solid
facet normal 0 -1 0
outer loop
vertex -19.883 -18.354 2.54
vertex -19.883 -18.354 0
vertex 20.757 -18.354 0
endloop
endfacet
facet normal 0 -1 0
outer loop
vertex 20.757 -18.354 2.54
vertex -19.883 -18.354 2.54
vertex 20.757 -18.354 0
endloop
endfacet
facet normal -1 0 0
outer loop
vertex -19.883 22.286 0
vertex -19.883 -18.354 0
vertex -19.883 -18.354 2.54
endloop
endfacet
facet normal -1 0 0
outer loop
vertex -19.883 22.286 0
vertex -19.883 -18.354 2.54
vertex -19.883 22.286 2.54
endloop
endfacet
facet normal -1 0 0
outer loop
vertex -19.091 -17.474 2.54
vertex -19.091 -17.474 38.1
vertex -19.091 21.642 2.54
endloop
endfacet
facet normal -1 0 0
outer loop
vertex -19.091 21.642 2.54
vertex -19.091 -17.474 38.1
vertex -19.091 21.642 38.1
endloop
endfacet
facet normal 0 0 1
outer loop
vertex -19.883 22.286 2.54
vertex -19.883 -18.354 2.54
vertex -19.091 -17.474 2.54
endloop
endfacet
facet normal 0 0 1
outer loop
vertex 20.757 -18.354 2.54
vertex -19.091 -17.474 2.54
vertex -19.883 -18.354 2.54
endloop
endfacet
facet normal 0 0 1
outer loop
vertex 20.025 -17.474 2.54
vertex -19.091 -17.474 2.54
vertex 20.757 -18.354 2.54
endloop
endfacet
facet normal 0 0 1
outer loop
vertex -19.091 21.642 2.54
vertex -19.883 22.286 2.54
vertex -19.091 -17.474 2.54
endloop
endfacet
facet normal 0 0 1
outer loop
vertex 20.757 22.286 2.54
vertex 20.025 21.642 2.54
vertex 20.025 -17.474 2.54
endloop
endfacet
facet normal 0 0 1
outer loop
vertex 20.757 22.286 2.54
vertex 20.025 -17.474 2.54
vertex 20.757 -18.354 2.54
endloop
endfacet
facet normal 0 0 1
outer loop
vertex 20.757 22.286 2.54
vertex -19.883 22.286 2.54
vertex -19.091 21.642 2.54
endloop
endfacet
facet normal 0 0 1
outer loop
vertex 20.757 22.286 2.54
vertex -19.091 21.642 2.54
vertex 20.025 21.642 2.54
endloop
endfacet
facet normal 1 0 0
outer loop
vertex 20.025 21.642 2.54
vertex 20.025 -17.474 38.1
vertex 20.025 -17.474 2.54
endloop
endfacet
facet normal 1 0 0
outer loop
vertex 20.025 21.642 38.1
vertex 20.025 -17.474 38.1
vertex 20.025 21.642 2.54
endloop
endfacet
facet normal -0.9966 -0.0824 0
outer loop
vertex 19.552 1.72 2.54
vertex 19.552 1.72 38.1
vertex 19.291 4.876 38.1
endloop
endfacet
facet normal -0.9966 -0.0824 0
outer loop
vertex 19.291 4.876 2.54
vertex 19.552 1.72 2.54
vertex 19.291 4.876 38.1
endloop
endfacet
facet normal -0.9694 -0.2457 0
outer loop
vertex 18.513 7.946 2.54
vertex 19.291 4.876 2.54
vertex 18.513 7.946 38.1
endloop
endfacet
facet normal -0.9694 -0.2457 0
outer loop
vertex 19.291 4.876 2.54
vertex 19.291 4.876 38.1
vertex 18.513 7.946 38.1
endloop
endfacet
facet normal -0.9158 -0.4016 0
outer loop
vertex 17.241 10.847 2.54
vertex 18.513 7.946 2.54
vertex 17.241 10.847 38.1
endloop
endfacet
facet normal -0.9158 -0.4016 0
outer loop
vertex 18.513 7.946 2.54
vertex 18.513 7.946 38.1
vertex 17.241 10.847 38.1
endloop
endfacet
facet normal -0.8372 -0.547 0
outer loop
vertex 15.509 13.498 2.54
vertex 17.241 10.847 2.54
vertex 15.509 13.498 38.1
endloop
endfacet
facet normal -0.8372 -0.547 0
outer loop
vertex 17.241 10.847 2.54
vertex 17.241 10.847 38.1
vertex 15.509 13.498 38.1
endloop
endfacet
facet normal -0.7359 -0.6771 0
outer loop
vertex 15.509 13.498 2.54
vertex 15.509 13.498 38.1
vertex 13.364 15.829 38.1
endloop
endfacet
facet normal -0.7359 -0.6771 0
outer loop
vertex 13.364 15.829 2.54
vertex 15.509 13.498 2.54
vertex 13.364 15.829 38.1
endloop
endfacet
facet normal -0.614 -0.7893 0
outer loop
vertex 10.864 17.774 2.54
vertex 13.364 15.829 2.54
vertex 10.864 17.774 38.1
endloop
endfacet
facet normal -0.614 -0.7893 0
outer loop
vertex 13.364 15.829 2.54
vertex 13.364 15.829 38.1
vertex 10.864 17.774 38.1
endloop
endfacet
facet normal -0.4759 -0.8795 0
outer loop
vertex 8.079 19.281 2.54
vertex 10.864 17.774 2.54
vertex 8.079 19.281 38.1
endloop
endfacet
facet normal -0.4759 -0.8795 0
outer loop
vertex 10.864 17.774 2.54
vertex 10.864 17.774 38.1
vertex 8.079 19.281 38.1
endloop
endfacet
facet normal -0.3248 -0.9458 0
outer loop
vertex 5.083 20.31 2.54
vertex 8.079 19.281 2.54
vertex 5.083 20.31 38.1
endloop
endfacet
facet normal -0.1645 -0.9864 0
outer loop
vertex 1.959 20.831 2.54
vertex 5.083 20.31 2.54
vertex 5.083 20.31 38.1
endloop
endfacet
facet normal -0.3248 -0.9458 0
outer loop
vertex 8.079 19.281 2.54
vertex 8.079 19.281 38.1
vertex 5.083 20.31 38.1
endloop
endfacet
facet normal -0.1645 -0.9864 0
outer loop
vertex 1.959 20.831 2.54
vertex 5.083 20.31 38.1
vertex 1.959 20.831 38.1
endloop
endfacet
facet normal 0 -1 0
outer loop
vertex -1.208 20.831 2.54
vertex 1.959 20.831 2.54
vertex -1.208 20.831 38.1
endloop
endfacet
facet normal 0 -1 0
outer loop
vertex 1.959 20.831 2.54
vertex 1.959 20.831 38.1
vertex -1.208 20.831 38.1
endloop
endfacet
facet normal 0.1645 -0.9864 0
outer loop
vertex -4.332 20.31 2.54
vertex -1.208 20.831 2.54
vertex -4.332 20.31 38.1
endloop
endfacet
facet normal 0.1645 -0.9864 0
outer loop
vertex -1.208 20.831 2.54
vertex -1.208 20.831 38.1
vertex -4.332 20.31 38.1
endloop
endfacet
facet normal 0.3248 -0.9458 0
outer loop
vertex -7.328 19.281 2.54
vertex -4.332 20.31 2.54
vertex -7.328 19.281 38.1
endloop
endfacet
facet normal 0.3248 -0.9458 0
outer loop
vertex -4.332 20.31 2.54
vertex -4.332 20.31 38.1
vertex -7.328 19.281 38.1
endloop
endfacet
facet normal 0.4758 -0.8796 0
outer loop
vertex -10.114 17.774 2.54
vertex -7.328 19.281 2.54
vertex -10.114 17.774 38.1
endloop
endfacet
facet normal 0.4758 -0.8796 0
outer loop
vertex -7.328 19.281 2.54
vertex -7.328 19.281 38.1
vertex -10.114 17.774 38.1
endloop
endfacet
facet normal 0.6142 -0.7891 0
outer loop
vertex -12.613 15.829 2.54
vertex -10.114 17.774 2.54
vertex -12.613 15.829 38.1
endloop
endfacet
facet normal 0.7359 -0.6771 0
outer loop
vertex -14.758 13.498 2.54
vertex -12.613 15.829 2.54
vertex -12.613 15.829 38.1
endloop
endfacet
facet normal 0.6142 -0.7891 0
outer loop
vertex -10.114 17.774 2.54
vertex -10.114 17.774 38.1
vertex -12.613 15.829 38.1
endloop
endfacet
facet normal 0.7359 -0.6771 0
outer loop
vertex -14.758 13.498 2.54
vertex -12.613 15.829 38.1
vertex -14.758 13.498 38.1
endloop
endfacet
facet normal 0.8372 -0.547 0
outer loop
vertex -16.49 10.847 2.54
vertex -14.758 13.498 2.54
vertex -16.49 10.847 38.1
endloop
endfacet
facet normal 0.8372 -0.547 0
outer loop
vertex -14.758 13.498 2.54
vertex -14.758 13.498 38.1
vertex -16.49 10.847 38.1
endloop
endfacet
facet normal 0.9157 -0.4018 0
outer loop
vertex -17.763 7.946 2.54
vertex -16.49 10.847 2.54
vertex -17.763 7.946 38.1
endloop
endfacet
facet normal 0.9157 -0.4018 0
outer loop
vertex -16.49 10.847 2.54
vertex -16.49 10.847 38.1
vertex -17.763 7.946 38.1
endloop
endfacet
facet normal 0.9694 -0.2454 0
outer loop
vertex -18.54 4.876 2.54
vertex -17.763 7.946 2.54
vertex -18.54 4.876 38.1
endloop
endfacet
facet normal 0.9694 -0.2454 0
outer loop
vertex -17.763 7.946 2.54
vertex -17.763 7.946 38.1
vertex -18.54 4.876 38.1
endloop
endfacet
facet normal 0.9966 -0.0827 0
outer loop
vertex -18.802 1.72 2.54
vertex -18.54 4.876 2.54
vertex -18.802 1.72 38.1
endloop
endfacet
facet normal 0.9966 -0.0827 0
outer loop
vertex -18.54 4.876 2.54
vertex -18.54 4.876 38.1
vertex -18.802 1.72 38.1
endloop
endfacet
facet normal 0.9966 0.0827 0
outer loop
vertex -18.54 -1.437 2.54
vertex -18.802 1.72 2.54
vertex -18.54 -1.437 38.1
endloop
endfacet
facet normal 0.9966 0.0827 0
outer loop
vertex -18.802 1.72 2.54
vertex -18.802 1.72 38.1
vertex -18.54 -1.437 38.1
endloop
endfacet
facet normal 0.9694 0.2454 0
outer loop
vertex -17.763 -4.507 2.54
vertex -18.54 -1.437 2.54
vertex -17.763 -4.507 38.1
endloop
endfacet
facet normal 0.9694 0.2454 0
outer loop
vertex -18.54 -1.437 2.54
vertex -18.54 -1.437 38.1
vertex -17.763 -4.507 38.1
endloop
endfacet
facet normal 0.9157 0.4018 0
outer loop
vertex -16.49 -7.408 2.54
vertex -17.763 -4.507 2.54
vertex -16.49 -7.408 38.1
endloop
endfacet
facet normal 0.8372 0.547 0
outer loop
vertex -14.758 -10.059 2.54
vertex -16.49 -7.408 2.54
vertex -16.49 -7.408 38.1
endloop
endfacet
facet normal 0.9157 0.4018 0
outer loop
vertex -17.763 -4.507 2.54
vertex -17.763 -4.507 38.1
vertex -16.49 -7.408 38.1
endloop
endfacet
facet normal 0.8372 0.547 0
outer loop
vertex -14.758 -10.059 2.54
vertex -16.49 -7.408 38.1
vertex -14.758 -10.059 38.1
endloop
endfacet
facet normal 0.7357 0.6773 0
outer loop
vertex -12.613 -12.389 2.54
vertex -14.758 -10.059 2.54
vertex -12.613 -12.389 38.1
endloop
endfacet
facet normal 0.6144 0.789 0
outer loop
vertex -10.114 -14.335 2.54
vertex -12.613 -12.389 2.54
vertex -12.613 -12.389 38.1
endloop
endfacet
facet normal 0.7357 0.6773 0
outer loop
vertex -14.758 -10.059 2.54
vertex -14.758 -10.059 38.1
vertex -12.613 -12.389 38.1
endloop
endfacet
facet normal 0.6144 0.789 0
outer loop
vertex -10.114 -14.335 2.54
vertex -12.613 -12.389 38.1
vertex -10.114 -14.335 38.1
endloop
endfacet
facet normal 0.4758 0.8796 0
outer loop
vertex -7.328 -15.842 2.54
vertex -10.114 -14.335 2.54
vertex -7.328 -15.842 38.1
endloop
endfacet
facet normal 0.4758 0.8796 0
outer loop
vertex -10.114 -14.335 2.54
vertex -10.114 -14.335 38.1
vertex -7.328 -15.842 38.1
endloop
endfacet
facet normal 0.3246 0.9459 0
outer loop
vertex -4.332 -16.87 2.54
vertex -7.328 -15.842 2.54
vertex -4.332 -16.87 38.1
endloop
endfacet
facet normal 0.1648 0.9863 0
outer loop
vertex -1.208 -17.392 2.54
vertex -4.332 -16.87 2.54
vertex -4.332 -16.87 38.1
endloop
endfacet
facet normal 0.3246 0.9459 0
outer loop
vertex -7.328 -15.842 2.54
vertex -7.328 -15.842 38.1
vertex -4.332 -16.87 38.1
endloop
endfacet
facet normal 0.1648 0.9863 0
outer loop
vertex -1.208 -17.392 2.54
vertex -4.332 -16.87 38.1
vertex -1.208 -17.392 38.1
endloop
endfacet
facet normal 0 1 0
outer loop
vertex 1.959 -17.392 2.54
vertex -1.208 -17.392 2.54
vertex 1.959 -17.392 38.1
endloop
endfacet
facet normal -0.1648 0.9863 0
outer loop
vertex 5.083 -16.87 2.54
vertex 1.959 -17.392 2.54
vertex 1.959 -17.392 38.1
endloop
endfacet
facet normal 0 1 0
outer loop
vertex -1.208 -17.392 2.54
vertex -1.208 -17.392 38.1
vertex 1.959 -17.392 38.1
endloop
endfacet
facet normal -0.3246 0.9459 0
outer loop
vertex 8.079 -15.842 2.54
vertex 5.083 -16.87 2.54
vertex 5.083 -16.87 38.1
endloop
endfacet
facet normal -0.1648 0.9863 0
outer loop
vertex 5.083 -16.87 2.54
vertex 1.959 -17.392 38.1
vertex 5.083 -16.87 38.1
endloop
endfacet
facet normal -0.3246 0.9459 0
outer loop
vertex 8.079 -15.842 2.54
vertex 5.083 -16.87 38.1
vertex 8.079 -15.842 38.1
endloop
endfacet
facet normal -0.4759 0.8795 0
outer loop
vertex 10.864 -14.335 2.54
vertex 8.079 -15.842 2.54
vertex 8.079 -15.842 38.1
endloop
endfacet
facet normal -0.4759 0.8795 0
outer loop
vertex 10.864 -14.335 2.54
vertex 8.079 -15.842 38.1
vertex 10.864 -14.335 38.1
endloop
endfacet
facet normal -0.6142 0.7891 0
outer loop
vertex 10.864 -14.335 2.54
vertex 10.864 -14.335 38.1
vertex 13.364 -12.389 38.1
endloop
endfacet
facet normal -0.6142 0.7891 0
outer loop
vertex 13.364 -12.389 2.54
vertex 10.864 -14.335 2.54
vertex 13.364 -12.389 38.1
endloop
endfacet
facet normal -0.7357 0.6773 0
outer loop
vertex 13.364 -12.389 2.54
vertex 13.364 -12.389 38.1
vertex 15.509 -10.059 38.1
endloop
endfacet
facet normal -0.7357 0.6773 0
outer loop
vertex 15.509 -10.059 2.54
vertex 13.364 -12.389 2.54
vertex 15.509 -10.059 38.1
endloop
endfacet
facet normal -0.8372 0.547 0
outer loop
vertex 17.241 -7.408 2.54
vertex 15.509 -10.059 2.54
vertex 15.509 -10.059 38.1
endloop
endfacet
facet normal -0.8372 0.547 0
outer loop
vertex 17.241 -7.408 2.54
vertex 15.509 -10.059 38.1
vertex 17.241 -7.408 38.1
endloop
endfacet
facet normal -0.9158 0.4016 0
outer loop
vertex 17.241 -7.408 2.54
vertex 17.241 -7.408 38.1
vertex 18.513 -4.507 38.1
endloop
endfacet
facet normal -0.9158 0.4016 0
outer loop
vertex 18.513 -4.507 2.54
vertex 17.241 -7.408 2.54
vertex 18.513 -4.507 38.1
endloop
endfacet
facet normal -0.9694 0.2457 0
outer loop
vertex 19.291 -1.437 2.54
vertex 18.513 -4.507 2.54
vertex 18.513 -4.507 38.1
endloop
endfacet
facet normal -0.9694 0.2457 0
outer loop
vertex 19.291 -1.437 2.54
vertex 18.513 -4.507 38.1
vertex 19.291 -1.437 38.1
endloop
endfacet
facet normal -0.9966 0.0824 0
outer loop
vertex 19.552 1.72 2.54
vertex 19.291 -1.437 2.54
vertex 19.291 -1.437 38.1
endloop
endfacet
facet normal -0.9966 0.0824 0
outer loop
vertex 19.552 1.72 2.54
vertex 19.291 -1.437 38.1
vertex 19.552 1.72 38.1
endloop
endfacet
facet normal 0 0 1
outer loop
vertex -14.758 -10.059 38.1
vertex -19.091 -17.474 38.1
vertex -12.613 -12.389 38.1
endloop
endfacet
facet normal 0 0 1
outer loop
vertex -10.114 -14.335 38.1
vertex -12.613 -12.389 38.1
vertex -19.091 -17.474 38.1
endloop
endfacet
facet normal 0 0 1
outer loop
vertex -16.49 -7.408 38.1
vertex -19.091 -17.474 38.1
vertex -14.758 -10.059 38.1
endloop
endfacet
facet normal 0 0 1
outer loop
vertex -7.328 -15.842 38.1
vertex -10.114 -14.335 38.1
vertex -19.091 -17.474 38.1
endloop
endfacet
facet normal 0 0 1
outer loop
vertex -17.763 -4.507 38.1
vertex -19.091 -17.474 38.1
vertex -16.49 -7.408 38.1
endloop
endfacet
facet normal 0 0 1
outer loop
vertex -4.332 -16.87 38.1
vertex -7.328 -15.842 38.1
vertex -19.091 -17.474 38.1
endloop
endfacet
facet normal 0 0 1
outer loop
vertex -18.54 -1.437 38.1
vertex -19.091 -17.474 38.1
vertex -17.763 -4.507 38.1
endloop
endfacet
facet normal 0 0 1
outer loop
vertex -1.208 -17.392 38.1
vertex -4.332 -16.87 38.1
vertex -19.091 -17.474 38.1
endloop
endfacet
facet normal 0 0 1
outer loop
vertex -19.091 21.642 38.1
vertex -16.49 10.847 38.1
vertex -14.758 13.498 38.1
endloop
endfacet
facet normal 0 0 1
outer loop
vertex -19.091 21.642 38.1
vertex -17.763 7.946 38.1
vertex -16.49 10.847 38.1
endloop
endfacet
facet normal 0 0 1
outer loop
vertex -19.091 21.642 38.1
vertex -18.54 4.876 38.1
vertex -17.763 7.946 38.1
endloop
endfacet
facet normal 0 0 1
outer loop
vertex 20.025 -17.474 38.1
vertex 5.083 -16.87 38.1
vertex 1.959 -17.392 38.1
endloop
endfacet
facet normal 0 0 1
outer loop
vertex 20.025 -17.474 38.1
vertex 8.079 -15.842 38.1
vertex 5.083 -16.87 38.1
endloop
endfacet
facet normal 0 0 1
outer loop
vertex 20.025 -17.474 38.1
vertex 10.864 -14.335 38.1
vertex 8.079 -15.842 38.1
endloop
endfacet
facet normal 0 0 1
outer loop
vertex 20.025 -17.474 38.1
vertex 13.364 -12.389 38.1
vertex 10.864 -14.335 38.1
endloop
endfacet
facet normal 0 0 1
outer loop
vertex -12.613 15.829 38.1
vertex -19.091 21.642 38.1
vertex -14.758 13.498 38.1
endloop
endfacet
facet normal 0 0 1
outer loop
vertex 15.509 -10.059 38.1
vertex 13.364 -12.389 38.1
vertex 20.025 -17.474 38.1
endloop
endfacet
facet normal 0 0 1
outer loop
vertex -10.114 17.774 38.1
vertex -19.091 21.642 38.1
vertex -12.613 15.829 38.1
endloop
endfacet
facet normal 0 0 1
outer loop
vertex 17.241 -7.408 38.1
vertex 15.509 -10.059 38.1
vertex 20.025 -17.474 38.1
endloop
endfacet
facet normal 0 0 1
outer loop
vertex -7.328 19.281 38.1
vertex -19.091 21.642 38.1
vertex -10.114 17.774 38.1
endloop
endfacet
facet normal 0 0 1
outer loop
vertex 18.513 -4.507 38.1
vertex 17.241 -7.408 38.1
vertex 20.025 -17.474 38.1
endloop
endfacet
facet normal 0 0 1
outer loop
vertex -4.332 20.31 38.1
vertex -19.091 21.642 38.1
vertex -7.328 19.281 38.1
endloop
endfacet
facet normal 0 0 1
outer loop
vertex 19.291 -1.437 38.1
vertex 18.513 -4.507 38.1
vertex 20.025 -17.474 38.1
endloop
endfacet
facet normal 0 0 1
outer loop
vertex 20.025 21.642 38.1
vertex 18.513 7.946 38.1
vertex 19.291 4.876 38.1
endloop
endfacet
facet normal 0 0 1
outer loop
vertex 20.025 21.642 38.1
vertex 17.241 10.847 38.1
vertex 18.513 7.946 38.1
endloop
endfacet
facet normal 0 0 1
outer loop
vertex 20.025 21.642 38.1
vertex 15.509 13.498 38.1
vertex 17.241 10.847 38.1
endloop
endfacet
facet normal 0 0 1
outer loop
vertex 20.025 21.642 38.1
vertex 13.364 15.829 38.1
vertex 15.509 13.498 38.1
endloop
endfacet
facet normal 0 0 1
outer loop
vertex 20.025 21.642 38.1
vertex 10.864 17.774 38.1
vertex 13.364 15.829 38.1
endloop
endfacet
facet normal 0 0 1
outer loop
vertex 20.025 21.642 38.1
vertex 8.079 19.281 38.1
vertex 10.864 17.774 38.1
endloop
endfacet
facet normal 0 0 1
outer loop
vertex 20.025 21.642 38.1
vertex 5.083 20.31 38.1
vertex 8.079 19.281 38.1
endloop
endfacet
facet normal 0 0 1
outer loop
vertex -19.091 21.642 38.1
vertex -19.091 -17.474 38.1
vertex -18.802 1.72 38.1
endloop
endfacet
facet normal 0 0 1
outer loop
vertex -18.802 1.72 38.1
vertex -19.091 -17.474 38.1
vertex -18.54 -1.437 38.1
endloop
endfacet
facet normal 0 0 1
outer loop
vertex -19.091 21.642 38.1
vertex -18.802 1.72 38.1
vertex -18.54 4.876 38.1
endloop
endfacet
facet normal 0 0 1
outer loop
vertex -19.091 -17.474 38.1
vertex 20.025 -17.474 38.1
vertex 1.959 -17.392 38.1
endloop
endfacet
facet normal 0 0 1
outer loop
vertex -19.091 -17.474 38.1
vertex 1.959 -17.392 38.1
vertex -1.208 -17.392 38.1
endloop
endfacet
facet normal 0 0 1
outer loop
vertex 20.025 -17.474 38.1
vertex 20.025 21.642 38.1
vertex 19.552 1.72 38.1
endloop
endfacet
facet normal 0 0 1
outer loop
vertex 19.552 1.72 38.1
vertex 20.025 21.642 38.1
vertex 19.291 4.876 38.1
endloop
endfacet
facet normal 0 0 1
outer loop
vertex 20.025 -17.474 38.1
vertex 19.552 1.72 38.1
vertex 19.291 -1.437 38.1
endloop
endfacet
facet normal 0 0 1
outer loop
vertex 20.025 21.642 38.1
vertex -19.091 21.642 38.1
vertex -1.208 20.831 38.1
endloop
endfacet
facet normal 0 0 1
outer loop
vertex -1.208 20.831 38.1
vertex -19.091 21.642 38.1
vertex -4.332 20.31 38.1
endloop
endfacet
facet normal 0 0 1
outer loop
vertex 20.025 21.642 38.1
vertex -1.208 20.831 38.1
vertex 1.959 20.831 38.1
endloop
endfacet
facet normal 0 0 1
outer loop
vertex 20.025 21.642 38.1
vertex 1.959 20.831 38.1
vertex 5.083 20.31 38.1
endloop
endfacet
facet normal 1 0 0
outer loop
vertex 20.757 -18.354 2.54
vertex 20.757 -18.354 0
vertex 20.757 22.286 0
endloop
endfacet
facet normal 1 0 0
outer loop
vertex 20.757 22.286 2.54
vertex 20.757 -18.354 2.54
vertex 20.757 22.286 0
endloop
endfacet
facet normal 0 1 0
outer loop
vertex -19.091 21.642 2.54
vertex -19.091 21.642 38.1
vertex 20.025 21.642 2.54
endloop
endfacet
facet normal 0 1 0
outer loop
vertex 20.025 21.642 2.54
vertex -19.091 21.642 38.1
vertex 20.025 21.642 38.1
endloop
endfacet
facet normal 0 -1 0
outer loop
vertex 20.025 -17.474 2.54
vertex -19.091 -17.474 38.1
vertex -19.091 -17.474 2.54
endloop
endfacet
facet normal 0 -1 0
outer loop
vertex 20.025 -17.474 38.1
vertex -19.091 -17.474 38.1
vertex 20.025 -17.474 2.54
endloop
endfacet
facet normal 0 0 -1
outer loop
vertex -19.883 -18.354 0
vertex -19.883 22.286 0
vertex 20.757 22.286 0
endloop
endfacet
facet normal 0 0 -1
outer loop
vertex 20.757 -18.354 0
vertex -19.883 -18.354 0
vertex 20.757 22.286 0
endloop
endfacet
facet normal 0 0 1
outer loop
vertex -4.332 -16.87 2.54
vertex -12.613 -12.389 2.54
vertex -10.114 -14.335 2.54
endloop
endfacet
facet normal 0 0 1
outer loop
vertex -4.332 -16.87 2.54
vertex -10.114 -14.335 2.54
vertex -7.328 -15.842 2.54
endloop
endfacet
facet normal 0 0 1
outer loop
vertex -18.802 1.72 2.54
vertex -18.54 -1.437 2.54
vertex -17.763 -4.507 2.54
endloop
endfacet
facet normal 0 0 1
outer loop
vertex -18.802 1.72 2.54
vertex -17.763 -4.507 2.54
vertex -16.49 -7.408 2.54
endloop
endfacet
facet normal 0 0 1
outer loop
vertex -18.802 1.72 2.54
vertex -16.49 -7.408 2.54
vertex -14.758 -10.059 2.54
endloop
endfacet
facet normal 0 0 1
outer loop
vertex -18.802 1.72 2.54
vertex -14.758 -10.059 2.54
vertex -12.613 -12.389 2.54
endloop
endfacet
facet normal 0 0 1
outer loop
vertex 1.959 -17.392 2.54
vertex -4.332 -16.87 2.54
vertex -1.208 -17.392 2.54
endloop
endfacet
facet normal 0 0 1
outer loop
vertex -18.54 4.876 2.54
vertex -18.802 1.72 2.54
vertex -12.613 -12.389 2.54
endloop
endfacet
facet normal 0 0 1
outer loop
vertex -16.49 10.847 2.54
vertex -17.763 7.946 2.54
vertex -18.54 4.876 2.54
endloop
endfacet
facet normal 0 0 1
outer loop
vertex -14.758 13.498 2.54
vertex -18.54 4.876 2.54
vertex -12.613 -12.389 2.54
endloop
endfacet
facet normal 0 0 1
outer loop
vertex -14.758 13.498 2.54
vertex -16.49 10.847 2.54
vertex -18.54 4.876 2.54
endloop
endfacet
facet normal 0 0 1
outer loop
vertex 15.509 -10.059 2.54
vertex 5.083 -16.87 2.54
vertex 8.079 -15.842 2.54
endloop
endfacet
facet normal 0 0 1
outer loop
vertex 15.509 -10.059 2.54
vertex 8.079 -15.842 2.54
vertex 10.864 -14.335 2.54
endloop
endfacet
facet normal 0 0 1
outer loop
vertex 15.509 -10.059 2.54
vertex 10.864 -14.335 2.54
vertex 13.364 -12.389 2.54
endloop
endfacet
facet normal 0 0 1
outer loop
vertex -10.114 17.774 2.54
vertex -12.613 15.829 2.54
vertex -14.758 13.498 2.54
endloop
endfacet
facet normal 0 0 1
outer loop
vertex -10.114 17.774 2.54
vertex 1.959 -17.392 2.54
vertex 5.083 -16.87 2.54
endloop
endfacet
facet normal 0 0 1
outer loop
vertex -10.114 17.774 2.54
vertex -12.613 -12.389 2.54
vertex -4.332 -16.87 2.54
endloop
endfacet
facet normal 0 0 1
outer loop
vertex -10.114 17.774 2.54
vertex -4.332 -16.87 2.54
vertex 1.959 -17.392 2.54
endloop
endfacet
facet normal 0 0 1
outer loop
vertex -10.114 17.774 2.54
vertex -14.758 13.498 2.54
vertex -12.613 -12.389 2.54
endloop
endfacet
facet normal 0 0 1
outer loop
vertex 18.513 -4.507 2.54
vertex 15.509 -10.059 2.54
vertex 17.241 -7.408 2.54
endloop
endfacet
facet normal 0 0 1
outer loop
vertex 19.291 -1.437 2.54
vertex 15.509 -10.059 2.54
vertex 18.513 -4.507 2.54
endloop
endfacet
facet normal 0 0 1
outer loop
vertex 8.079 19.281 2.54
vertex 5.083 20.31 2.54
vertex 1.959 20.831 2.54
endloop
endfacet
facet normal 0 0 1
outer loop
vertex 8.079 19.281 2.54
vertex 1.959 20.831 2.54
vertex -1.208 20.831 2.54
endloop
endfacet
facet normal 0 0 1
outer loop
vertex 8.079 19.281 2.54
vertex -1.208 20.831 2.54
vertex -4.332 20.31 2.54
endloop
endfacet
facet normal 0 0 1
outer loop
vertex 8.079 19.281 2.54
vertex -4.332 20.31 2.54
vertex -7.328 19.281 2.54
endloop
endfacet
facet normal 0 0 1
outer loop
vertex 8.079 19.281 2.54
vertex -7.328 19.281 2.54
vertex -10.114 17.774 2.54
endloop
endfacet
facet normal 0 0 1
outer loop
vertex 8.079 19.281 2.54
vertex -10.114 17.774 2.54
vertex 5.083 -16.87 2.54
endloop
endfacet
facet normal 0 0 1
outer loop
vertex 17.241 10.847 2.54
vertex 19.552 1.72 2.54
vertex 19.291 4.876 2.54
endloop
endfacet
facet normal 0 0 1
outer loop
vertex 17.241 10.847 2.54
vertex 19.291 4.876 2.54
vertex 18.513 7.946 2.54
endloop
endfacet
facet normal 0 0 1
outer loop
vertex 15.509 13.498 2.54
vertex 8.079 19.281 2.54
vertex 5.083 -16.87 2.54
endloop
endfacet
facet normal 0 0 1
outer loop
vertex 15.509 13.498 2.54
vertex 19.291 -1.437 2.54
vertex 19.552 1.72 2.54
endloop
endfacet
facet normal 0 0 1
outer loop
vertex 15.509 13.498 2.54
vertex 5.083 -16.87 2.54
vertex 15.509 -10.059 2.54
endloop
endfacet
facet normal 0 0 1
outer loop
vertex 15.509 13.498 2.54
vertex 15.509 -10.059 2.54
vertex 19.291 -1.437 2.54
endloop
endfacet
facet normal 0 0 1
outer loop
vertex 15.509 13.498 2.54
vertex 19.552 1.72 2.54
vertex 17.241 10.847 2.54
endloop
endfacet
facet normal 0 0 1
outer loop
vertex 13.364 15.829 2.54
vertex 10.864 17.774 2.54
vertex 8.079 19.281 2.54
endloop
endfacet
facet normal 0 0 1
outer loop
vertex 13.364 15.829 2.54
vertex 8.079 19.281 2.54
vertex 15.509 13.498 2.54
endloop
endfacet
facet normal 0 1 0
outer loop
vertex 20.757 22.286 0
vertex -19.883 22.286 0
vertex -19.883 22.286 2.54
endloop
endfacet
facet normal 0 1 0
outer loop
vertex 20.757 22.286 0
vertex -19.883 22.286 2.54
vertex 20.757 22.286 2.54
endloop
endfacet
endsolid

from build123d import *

# Parameters (mm, degrees)
SKETCH2_W           = 40.64
SKETCH2_H           = 40.64
BOSS_EXTRUDE1_DEPTH = 38.1
SKETCH3_W           = 40.64
SKETCH3_H           = 40.64
SKETCH3_W_2         = 39.116
SKETCH3_H_2         = 39.116
CUT_EXTRUDE1_DEPTH  = 35.56
SKETCH4_R           = 19.177
CUT_EXTRUDE3_DEPTH  = 35.56


with BuildPart() as part:
    # Sketch2 → Boss-Extrude1 (new body)
    with BuildSketch(Plane.XY):
        with Locations((0.436989247, 1.966451613)):
            Rectangle(SKETCH2_W, SKETCH2_H)
    extrude(amount=BOSS_EXTRUDE1_DEPTH)

    # Sketch3 → Cut-Extrude1 (cut)
    with BuildSketch(Plane.XY.offset(38.1)):
        with Locations((0.436989247, 1.966451613)):
            Rectangle(SKETCH3_W, SKETCH3_H)
        with Locations((0.466860662, 2.084424142)):
            Rectangle(SKETCH3_W_2, SKETCH3_H_2, mode=Mode.SUBTRACT)
    extrude(amount=-CUT_EXTRUDE1_DEPTH, mode=Mode.SUBTRACT)

    # Sketch4 → Cut-Extrude3 (cut)
    with BuildSketch(Plane.XY.offset(38.1)):
        with Locations((0.37530299, 1.719706585)):
            Circle(SKETCH4_R)
    extrude(amount=-CUT_EXTRUDE3_DEPTH, mode=Mode.SUBTRACT)


solid = part.part
